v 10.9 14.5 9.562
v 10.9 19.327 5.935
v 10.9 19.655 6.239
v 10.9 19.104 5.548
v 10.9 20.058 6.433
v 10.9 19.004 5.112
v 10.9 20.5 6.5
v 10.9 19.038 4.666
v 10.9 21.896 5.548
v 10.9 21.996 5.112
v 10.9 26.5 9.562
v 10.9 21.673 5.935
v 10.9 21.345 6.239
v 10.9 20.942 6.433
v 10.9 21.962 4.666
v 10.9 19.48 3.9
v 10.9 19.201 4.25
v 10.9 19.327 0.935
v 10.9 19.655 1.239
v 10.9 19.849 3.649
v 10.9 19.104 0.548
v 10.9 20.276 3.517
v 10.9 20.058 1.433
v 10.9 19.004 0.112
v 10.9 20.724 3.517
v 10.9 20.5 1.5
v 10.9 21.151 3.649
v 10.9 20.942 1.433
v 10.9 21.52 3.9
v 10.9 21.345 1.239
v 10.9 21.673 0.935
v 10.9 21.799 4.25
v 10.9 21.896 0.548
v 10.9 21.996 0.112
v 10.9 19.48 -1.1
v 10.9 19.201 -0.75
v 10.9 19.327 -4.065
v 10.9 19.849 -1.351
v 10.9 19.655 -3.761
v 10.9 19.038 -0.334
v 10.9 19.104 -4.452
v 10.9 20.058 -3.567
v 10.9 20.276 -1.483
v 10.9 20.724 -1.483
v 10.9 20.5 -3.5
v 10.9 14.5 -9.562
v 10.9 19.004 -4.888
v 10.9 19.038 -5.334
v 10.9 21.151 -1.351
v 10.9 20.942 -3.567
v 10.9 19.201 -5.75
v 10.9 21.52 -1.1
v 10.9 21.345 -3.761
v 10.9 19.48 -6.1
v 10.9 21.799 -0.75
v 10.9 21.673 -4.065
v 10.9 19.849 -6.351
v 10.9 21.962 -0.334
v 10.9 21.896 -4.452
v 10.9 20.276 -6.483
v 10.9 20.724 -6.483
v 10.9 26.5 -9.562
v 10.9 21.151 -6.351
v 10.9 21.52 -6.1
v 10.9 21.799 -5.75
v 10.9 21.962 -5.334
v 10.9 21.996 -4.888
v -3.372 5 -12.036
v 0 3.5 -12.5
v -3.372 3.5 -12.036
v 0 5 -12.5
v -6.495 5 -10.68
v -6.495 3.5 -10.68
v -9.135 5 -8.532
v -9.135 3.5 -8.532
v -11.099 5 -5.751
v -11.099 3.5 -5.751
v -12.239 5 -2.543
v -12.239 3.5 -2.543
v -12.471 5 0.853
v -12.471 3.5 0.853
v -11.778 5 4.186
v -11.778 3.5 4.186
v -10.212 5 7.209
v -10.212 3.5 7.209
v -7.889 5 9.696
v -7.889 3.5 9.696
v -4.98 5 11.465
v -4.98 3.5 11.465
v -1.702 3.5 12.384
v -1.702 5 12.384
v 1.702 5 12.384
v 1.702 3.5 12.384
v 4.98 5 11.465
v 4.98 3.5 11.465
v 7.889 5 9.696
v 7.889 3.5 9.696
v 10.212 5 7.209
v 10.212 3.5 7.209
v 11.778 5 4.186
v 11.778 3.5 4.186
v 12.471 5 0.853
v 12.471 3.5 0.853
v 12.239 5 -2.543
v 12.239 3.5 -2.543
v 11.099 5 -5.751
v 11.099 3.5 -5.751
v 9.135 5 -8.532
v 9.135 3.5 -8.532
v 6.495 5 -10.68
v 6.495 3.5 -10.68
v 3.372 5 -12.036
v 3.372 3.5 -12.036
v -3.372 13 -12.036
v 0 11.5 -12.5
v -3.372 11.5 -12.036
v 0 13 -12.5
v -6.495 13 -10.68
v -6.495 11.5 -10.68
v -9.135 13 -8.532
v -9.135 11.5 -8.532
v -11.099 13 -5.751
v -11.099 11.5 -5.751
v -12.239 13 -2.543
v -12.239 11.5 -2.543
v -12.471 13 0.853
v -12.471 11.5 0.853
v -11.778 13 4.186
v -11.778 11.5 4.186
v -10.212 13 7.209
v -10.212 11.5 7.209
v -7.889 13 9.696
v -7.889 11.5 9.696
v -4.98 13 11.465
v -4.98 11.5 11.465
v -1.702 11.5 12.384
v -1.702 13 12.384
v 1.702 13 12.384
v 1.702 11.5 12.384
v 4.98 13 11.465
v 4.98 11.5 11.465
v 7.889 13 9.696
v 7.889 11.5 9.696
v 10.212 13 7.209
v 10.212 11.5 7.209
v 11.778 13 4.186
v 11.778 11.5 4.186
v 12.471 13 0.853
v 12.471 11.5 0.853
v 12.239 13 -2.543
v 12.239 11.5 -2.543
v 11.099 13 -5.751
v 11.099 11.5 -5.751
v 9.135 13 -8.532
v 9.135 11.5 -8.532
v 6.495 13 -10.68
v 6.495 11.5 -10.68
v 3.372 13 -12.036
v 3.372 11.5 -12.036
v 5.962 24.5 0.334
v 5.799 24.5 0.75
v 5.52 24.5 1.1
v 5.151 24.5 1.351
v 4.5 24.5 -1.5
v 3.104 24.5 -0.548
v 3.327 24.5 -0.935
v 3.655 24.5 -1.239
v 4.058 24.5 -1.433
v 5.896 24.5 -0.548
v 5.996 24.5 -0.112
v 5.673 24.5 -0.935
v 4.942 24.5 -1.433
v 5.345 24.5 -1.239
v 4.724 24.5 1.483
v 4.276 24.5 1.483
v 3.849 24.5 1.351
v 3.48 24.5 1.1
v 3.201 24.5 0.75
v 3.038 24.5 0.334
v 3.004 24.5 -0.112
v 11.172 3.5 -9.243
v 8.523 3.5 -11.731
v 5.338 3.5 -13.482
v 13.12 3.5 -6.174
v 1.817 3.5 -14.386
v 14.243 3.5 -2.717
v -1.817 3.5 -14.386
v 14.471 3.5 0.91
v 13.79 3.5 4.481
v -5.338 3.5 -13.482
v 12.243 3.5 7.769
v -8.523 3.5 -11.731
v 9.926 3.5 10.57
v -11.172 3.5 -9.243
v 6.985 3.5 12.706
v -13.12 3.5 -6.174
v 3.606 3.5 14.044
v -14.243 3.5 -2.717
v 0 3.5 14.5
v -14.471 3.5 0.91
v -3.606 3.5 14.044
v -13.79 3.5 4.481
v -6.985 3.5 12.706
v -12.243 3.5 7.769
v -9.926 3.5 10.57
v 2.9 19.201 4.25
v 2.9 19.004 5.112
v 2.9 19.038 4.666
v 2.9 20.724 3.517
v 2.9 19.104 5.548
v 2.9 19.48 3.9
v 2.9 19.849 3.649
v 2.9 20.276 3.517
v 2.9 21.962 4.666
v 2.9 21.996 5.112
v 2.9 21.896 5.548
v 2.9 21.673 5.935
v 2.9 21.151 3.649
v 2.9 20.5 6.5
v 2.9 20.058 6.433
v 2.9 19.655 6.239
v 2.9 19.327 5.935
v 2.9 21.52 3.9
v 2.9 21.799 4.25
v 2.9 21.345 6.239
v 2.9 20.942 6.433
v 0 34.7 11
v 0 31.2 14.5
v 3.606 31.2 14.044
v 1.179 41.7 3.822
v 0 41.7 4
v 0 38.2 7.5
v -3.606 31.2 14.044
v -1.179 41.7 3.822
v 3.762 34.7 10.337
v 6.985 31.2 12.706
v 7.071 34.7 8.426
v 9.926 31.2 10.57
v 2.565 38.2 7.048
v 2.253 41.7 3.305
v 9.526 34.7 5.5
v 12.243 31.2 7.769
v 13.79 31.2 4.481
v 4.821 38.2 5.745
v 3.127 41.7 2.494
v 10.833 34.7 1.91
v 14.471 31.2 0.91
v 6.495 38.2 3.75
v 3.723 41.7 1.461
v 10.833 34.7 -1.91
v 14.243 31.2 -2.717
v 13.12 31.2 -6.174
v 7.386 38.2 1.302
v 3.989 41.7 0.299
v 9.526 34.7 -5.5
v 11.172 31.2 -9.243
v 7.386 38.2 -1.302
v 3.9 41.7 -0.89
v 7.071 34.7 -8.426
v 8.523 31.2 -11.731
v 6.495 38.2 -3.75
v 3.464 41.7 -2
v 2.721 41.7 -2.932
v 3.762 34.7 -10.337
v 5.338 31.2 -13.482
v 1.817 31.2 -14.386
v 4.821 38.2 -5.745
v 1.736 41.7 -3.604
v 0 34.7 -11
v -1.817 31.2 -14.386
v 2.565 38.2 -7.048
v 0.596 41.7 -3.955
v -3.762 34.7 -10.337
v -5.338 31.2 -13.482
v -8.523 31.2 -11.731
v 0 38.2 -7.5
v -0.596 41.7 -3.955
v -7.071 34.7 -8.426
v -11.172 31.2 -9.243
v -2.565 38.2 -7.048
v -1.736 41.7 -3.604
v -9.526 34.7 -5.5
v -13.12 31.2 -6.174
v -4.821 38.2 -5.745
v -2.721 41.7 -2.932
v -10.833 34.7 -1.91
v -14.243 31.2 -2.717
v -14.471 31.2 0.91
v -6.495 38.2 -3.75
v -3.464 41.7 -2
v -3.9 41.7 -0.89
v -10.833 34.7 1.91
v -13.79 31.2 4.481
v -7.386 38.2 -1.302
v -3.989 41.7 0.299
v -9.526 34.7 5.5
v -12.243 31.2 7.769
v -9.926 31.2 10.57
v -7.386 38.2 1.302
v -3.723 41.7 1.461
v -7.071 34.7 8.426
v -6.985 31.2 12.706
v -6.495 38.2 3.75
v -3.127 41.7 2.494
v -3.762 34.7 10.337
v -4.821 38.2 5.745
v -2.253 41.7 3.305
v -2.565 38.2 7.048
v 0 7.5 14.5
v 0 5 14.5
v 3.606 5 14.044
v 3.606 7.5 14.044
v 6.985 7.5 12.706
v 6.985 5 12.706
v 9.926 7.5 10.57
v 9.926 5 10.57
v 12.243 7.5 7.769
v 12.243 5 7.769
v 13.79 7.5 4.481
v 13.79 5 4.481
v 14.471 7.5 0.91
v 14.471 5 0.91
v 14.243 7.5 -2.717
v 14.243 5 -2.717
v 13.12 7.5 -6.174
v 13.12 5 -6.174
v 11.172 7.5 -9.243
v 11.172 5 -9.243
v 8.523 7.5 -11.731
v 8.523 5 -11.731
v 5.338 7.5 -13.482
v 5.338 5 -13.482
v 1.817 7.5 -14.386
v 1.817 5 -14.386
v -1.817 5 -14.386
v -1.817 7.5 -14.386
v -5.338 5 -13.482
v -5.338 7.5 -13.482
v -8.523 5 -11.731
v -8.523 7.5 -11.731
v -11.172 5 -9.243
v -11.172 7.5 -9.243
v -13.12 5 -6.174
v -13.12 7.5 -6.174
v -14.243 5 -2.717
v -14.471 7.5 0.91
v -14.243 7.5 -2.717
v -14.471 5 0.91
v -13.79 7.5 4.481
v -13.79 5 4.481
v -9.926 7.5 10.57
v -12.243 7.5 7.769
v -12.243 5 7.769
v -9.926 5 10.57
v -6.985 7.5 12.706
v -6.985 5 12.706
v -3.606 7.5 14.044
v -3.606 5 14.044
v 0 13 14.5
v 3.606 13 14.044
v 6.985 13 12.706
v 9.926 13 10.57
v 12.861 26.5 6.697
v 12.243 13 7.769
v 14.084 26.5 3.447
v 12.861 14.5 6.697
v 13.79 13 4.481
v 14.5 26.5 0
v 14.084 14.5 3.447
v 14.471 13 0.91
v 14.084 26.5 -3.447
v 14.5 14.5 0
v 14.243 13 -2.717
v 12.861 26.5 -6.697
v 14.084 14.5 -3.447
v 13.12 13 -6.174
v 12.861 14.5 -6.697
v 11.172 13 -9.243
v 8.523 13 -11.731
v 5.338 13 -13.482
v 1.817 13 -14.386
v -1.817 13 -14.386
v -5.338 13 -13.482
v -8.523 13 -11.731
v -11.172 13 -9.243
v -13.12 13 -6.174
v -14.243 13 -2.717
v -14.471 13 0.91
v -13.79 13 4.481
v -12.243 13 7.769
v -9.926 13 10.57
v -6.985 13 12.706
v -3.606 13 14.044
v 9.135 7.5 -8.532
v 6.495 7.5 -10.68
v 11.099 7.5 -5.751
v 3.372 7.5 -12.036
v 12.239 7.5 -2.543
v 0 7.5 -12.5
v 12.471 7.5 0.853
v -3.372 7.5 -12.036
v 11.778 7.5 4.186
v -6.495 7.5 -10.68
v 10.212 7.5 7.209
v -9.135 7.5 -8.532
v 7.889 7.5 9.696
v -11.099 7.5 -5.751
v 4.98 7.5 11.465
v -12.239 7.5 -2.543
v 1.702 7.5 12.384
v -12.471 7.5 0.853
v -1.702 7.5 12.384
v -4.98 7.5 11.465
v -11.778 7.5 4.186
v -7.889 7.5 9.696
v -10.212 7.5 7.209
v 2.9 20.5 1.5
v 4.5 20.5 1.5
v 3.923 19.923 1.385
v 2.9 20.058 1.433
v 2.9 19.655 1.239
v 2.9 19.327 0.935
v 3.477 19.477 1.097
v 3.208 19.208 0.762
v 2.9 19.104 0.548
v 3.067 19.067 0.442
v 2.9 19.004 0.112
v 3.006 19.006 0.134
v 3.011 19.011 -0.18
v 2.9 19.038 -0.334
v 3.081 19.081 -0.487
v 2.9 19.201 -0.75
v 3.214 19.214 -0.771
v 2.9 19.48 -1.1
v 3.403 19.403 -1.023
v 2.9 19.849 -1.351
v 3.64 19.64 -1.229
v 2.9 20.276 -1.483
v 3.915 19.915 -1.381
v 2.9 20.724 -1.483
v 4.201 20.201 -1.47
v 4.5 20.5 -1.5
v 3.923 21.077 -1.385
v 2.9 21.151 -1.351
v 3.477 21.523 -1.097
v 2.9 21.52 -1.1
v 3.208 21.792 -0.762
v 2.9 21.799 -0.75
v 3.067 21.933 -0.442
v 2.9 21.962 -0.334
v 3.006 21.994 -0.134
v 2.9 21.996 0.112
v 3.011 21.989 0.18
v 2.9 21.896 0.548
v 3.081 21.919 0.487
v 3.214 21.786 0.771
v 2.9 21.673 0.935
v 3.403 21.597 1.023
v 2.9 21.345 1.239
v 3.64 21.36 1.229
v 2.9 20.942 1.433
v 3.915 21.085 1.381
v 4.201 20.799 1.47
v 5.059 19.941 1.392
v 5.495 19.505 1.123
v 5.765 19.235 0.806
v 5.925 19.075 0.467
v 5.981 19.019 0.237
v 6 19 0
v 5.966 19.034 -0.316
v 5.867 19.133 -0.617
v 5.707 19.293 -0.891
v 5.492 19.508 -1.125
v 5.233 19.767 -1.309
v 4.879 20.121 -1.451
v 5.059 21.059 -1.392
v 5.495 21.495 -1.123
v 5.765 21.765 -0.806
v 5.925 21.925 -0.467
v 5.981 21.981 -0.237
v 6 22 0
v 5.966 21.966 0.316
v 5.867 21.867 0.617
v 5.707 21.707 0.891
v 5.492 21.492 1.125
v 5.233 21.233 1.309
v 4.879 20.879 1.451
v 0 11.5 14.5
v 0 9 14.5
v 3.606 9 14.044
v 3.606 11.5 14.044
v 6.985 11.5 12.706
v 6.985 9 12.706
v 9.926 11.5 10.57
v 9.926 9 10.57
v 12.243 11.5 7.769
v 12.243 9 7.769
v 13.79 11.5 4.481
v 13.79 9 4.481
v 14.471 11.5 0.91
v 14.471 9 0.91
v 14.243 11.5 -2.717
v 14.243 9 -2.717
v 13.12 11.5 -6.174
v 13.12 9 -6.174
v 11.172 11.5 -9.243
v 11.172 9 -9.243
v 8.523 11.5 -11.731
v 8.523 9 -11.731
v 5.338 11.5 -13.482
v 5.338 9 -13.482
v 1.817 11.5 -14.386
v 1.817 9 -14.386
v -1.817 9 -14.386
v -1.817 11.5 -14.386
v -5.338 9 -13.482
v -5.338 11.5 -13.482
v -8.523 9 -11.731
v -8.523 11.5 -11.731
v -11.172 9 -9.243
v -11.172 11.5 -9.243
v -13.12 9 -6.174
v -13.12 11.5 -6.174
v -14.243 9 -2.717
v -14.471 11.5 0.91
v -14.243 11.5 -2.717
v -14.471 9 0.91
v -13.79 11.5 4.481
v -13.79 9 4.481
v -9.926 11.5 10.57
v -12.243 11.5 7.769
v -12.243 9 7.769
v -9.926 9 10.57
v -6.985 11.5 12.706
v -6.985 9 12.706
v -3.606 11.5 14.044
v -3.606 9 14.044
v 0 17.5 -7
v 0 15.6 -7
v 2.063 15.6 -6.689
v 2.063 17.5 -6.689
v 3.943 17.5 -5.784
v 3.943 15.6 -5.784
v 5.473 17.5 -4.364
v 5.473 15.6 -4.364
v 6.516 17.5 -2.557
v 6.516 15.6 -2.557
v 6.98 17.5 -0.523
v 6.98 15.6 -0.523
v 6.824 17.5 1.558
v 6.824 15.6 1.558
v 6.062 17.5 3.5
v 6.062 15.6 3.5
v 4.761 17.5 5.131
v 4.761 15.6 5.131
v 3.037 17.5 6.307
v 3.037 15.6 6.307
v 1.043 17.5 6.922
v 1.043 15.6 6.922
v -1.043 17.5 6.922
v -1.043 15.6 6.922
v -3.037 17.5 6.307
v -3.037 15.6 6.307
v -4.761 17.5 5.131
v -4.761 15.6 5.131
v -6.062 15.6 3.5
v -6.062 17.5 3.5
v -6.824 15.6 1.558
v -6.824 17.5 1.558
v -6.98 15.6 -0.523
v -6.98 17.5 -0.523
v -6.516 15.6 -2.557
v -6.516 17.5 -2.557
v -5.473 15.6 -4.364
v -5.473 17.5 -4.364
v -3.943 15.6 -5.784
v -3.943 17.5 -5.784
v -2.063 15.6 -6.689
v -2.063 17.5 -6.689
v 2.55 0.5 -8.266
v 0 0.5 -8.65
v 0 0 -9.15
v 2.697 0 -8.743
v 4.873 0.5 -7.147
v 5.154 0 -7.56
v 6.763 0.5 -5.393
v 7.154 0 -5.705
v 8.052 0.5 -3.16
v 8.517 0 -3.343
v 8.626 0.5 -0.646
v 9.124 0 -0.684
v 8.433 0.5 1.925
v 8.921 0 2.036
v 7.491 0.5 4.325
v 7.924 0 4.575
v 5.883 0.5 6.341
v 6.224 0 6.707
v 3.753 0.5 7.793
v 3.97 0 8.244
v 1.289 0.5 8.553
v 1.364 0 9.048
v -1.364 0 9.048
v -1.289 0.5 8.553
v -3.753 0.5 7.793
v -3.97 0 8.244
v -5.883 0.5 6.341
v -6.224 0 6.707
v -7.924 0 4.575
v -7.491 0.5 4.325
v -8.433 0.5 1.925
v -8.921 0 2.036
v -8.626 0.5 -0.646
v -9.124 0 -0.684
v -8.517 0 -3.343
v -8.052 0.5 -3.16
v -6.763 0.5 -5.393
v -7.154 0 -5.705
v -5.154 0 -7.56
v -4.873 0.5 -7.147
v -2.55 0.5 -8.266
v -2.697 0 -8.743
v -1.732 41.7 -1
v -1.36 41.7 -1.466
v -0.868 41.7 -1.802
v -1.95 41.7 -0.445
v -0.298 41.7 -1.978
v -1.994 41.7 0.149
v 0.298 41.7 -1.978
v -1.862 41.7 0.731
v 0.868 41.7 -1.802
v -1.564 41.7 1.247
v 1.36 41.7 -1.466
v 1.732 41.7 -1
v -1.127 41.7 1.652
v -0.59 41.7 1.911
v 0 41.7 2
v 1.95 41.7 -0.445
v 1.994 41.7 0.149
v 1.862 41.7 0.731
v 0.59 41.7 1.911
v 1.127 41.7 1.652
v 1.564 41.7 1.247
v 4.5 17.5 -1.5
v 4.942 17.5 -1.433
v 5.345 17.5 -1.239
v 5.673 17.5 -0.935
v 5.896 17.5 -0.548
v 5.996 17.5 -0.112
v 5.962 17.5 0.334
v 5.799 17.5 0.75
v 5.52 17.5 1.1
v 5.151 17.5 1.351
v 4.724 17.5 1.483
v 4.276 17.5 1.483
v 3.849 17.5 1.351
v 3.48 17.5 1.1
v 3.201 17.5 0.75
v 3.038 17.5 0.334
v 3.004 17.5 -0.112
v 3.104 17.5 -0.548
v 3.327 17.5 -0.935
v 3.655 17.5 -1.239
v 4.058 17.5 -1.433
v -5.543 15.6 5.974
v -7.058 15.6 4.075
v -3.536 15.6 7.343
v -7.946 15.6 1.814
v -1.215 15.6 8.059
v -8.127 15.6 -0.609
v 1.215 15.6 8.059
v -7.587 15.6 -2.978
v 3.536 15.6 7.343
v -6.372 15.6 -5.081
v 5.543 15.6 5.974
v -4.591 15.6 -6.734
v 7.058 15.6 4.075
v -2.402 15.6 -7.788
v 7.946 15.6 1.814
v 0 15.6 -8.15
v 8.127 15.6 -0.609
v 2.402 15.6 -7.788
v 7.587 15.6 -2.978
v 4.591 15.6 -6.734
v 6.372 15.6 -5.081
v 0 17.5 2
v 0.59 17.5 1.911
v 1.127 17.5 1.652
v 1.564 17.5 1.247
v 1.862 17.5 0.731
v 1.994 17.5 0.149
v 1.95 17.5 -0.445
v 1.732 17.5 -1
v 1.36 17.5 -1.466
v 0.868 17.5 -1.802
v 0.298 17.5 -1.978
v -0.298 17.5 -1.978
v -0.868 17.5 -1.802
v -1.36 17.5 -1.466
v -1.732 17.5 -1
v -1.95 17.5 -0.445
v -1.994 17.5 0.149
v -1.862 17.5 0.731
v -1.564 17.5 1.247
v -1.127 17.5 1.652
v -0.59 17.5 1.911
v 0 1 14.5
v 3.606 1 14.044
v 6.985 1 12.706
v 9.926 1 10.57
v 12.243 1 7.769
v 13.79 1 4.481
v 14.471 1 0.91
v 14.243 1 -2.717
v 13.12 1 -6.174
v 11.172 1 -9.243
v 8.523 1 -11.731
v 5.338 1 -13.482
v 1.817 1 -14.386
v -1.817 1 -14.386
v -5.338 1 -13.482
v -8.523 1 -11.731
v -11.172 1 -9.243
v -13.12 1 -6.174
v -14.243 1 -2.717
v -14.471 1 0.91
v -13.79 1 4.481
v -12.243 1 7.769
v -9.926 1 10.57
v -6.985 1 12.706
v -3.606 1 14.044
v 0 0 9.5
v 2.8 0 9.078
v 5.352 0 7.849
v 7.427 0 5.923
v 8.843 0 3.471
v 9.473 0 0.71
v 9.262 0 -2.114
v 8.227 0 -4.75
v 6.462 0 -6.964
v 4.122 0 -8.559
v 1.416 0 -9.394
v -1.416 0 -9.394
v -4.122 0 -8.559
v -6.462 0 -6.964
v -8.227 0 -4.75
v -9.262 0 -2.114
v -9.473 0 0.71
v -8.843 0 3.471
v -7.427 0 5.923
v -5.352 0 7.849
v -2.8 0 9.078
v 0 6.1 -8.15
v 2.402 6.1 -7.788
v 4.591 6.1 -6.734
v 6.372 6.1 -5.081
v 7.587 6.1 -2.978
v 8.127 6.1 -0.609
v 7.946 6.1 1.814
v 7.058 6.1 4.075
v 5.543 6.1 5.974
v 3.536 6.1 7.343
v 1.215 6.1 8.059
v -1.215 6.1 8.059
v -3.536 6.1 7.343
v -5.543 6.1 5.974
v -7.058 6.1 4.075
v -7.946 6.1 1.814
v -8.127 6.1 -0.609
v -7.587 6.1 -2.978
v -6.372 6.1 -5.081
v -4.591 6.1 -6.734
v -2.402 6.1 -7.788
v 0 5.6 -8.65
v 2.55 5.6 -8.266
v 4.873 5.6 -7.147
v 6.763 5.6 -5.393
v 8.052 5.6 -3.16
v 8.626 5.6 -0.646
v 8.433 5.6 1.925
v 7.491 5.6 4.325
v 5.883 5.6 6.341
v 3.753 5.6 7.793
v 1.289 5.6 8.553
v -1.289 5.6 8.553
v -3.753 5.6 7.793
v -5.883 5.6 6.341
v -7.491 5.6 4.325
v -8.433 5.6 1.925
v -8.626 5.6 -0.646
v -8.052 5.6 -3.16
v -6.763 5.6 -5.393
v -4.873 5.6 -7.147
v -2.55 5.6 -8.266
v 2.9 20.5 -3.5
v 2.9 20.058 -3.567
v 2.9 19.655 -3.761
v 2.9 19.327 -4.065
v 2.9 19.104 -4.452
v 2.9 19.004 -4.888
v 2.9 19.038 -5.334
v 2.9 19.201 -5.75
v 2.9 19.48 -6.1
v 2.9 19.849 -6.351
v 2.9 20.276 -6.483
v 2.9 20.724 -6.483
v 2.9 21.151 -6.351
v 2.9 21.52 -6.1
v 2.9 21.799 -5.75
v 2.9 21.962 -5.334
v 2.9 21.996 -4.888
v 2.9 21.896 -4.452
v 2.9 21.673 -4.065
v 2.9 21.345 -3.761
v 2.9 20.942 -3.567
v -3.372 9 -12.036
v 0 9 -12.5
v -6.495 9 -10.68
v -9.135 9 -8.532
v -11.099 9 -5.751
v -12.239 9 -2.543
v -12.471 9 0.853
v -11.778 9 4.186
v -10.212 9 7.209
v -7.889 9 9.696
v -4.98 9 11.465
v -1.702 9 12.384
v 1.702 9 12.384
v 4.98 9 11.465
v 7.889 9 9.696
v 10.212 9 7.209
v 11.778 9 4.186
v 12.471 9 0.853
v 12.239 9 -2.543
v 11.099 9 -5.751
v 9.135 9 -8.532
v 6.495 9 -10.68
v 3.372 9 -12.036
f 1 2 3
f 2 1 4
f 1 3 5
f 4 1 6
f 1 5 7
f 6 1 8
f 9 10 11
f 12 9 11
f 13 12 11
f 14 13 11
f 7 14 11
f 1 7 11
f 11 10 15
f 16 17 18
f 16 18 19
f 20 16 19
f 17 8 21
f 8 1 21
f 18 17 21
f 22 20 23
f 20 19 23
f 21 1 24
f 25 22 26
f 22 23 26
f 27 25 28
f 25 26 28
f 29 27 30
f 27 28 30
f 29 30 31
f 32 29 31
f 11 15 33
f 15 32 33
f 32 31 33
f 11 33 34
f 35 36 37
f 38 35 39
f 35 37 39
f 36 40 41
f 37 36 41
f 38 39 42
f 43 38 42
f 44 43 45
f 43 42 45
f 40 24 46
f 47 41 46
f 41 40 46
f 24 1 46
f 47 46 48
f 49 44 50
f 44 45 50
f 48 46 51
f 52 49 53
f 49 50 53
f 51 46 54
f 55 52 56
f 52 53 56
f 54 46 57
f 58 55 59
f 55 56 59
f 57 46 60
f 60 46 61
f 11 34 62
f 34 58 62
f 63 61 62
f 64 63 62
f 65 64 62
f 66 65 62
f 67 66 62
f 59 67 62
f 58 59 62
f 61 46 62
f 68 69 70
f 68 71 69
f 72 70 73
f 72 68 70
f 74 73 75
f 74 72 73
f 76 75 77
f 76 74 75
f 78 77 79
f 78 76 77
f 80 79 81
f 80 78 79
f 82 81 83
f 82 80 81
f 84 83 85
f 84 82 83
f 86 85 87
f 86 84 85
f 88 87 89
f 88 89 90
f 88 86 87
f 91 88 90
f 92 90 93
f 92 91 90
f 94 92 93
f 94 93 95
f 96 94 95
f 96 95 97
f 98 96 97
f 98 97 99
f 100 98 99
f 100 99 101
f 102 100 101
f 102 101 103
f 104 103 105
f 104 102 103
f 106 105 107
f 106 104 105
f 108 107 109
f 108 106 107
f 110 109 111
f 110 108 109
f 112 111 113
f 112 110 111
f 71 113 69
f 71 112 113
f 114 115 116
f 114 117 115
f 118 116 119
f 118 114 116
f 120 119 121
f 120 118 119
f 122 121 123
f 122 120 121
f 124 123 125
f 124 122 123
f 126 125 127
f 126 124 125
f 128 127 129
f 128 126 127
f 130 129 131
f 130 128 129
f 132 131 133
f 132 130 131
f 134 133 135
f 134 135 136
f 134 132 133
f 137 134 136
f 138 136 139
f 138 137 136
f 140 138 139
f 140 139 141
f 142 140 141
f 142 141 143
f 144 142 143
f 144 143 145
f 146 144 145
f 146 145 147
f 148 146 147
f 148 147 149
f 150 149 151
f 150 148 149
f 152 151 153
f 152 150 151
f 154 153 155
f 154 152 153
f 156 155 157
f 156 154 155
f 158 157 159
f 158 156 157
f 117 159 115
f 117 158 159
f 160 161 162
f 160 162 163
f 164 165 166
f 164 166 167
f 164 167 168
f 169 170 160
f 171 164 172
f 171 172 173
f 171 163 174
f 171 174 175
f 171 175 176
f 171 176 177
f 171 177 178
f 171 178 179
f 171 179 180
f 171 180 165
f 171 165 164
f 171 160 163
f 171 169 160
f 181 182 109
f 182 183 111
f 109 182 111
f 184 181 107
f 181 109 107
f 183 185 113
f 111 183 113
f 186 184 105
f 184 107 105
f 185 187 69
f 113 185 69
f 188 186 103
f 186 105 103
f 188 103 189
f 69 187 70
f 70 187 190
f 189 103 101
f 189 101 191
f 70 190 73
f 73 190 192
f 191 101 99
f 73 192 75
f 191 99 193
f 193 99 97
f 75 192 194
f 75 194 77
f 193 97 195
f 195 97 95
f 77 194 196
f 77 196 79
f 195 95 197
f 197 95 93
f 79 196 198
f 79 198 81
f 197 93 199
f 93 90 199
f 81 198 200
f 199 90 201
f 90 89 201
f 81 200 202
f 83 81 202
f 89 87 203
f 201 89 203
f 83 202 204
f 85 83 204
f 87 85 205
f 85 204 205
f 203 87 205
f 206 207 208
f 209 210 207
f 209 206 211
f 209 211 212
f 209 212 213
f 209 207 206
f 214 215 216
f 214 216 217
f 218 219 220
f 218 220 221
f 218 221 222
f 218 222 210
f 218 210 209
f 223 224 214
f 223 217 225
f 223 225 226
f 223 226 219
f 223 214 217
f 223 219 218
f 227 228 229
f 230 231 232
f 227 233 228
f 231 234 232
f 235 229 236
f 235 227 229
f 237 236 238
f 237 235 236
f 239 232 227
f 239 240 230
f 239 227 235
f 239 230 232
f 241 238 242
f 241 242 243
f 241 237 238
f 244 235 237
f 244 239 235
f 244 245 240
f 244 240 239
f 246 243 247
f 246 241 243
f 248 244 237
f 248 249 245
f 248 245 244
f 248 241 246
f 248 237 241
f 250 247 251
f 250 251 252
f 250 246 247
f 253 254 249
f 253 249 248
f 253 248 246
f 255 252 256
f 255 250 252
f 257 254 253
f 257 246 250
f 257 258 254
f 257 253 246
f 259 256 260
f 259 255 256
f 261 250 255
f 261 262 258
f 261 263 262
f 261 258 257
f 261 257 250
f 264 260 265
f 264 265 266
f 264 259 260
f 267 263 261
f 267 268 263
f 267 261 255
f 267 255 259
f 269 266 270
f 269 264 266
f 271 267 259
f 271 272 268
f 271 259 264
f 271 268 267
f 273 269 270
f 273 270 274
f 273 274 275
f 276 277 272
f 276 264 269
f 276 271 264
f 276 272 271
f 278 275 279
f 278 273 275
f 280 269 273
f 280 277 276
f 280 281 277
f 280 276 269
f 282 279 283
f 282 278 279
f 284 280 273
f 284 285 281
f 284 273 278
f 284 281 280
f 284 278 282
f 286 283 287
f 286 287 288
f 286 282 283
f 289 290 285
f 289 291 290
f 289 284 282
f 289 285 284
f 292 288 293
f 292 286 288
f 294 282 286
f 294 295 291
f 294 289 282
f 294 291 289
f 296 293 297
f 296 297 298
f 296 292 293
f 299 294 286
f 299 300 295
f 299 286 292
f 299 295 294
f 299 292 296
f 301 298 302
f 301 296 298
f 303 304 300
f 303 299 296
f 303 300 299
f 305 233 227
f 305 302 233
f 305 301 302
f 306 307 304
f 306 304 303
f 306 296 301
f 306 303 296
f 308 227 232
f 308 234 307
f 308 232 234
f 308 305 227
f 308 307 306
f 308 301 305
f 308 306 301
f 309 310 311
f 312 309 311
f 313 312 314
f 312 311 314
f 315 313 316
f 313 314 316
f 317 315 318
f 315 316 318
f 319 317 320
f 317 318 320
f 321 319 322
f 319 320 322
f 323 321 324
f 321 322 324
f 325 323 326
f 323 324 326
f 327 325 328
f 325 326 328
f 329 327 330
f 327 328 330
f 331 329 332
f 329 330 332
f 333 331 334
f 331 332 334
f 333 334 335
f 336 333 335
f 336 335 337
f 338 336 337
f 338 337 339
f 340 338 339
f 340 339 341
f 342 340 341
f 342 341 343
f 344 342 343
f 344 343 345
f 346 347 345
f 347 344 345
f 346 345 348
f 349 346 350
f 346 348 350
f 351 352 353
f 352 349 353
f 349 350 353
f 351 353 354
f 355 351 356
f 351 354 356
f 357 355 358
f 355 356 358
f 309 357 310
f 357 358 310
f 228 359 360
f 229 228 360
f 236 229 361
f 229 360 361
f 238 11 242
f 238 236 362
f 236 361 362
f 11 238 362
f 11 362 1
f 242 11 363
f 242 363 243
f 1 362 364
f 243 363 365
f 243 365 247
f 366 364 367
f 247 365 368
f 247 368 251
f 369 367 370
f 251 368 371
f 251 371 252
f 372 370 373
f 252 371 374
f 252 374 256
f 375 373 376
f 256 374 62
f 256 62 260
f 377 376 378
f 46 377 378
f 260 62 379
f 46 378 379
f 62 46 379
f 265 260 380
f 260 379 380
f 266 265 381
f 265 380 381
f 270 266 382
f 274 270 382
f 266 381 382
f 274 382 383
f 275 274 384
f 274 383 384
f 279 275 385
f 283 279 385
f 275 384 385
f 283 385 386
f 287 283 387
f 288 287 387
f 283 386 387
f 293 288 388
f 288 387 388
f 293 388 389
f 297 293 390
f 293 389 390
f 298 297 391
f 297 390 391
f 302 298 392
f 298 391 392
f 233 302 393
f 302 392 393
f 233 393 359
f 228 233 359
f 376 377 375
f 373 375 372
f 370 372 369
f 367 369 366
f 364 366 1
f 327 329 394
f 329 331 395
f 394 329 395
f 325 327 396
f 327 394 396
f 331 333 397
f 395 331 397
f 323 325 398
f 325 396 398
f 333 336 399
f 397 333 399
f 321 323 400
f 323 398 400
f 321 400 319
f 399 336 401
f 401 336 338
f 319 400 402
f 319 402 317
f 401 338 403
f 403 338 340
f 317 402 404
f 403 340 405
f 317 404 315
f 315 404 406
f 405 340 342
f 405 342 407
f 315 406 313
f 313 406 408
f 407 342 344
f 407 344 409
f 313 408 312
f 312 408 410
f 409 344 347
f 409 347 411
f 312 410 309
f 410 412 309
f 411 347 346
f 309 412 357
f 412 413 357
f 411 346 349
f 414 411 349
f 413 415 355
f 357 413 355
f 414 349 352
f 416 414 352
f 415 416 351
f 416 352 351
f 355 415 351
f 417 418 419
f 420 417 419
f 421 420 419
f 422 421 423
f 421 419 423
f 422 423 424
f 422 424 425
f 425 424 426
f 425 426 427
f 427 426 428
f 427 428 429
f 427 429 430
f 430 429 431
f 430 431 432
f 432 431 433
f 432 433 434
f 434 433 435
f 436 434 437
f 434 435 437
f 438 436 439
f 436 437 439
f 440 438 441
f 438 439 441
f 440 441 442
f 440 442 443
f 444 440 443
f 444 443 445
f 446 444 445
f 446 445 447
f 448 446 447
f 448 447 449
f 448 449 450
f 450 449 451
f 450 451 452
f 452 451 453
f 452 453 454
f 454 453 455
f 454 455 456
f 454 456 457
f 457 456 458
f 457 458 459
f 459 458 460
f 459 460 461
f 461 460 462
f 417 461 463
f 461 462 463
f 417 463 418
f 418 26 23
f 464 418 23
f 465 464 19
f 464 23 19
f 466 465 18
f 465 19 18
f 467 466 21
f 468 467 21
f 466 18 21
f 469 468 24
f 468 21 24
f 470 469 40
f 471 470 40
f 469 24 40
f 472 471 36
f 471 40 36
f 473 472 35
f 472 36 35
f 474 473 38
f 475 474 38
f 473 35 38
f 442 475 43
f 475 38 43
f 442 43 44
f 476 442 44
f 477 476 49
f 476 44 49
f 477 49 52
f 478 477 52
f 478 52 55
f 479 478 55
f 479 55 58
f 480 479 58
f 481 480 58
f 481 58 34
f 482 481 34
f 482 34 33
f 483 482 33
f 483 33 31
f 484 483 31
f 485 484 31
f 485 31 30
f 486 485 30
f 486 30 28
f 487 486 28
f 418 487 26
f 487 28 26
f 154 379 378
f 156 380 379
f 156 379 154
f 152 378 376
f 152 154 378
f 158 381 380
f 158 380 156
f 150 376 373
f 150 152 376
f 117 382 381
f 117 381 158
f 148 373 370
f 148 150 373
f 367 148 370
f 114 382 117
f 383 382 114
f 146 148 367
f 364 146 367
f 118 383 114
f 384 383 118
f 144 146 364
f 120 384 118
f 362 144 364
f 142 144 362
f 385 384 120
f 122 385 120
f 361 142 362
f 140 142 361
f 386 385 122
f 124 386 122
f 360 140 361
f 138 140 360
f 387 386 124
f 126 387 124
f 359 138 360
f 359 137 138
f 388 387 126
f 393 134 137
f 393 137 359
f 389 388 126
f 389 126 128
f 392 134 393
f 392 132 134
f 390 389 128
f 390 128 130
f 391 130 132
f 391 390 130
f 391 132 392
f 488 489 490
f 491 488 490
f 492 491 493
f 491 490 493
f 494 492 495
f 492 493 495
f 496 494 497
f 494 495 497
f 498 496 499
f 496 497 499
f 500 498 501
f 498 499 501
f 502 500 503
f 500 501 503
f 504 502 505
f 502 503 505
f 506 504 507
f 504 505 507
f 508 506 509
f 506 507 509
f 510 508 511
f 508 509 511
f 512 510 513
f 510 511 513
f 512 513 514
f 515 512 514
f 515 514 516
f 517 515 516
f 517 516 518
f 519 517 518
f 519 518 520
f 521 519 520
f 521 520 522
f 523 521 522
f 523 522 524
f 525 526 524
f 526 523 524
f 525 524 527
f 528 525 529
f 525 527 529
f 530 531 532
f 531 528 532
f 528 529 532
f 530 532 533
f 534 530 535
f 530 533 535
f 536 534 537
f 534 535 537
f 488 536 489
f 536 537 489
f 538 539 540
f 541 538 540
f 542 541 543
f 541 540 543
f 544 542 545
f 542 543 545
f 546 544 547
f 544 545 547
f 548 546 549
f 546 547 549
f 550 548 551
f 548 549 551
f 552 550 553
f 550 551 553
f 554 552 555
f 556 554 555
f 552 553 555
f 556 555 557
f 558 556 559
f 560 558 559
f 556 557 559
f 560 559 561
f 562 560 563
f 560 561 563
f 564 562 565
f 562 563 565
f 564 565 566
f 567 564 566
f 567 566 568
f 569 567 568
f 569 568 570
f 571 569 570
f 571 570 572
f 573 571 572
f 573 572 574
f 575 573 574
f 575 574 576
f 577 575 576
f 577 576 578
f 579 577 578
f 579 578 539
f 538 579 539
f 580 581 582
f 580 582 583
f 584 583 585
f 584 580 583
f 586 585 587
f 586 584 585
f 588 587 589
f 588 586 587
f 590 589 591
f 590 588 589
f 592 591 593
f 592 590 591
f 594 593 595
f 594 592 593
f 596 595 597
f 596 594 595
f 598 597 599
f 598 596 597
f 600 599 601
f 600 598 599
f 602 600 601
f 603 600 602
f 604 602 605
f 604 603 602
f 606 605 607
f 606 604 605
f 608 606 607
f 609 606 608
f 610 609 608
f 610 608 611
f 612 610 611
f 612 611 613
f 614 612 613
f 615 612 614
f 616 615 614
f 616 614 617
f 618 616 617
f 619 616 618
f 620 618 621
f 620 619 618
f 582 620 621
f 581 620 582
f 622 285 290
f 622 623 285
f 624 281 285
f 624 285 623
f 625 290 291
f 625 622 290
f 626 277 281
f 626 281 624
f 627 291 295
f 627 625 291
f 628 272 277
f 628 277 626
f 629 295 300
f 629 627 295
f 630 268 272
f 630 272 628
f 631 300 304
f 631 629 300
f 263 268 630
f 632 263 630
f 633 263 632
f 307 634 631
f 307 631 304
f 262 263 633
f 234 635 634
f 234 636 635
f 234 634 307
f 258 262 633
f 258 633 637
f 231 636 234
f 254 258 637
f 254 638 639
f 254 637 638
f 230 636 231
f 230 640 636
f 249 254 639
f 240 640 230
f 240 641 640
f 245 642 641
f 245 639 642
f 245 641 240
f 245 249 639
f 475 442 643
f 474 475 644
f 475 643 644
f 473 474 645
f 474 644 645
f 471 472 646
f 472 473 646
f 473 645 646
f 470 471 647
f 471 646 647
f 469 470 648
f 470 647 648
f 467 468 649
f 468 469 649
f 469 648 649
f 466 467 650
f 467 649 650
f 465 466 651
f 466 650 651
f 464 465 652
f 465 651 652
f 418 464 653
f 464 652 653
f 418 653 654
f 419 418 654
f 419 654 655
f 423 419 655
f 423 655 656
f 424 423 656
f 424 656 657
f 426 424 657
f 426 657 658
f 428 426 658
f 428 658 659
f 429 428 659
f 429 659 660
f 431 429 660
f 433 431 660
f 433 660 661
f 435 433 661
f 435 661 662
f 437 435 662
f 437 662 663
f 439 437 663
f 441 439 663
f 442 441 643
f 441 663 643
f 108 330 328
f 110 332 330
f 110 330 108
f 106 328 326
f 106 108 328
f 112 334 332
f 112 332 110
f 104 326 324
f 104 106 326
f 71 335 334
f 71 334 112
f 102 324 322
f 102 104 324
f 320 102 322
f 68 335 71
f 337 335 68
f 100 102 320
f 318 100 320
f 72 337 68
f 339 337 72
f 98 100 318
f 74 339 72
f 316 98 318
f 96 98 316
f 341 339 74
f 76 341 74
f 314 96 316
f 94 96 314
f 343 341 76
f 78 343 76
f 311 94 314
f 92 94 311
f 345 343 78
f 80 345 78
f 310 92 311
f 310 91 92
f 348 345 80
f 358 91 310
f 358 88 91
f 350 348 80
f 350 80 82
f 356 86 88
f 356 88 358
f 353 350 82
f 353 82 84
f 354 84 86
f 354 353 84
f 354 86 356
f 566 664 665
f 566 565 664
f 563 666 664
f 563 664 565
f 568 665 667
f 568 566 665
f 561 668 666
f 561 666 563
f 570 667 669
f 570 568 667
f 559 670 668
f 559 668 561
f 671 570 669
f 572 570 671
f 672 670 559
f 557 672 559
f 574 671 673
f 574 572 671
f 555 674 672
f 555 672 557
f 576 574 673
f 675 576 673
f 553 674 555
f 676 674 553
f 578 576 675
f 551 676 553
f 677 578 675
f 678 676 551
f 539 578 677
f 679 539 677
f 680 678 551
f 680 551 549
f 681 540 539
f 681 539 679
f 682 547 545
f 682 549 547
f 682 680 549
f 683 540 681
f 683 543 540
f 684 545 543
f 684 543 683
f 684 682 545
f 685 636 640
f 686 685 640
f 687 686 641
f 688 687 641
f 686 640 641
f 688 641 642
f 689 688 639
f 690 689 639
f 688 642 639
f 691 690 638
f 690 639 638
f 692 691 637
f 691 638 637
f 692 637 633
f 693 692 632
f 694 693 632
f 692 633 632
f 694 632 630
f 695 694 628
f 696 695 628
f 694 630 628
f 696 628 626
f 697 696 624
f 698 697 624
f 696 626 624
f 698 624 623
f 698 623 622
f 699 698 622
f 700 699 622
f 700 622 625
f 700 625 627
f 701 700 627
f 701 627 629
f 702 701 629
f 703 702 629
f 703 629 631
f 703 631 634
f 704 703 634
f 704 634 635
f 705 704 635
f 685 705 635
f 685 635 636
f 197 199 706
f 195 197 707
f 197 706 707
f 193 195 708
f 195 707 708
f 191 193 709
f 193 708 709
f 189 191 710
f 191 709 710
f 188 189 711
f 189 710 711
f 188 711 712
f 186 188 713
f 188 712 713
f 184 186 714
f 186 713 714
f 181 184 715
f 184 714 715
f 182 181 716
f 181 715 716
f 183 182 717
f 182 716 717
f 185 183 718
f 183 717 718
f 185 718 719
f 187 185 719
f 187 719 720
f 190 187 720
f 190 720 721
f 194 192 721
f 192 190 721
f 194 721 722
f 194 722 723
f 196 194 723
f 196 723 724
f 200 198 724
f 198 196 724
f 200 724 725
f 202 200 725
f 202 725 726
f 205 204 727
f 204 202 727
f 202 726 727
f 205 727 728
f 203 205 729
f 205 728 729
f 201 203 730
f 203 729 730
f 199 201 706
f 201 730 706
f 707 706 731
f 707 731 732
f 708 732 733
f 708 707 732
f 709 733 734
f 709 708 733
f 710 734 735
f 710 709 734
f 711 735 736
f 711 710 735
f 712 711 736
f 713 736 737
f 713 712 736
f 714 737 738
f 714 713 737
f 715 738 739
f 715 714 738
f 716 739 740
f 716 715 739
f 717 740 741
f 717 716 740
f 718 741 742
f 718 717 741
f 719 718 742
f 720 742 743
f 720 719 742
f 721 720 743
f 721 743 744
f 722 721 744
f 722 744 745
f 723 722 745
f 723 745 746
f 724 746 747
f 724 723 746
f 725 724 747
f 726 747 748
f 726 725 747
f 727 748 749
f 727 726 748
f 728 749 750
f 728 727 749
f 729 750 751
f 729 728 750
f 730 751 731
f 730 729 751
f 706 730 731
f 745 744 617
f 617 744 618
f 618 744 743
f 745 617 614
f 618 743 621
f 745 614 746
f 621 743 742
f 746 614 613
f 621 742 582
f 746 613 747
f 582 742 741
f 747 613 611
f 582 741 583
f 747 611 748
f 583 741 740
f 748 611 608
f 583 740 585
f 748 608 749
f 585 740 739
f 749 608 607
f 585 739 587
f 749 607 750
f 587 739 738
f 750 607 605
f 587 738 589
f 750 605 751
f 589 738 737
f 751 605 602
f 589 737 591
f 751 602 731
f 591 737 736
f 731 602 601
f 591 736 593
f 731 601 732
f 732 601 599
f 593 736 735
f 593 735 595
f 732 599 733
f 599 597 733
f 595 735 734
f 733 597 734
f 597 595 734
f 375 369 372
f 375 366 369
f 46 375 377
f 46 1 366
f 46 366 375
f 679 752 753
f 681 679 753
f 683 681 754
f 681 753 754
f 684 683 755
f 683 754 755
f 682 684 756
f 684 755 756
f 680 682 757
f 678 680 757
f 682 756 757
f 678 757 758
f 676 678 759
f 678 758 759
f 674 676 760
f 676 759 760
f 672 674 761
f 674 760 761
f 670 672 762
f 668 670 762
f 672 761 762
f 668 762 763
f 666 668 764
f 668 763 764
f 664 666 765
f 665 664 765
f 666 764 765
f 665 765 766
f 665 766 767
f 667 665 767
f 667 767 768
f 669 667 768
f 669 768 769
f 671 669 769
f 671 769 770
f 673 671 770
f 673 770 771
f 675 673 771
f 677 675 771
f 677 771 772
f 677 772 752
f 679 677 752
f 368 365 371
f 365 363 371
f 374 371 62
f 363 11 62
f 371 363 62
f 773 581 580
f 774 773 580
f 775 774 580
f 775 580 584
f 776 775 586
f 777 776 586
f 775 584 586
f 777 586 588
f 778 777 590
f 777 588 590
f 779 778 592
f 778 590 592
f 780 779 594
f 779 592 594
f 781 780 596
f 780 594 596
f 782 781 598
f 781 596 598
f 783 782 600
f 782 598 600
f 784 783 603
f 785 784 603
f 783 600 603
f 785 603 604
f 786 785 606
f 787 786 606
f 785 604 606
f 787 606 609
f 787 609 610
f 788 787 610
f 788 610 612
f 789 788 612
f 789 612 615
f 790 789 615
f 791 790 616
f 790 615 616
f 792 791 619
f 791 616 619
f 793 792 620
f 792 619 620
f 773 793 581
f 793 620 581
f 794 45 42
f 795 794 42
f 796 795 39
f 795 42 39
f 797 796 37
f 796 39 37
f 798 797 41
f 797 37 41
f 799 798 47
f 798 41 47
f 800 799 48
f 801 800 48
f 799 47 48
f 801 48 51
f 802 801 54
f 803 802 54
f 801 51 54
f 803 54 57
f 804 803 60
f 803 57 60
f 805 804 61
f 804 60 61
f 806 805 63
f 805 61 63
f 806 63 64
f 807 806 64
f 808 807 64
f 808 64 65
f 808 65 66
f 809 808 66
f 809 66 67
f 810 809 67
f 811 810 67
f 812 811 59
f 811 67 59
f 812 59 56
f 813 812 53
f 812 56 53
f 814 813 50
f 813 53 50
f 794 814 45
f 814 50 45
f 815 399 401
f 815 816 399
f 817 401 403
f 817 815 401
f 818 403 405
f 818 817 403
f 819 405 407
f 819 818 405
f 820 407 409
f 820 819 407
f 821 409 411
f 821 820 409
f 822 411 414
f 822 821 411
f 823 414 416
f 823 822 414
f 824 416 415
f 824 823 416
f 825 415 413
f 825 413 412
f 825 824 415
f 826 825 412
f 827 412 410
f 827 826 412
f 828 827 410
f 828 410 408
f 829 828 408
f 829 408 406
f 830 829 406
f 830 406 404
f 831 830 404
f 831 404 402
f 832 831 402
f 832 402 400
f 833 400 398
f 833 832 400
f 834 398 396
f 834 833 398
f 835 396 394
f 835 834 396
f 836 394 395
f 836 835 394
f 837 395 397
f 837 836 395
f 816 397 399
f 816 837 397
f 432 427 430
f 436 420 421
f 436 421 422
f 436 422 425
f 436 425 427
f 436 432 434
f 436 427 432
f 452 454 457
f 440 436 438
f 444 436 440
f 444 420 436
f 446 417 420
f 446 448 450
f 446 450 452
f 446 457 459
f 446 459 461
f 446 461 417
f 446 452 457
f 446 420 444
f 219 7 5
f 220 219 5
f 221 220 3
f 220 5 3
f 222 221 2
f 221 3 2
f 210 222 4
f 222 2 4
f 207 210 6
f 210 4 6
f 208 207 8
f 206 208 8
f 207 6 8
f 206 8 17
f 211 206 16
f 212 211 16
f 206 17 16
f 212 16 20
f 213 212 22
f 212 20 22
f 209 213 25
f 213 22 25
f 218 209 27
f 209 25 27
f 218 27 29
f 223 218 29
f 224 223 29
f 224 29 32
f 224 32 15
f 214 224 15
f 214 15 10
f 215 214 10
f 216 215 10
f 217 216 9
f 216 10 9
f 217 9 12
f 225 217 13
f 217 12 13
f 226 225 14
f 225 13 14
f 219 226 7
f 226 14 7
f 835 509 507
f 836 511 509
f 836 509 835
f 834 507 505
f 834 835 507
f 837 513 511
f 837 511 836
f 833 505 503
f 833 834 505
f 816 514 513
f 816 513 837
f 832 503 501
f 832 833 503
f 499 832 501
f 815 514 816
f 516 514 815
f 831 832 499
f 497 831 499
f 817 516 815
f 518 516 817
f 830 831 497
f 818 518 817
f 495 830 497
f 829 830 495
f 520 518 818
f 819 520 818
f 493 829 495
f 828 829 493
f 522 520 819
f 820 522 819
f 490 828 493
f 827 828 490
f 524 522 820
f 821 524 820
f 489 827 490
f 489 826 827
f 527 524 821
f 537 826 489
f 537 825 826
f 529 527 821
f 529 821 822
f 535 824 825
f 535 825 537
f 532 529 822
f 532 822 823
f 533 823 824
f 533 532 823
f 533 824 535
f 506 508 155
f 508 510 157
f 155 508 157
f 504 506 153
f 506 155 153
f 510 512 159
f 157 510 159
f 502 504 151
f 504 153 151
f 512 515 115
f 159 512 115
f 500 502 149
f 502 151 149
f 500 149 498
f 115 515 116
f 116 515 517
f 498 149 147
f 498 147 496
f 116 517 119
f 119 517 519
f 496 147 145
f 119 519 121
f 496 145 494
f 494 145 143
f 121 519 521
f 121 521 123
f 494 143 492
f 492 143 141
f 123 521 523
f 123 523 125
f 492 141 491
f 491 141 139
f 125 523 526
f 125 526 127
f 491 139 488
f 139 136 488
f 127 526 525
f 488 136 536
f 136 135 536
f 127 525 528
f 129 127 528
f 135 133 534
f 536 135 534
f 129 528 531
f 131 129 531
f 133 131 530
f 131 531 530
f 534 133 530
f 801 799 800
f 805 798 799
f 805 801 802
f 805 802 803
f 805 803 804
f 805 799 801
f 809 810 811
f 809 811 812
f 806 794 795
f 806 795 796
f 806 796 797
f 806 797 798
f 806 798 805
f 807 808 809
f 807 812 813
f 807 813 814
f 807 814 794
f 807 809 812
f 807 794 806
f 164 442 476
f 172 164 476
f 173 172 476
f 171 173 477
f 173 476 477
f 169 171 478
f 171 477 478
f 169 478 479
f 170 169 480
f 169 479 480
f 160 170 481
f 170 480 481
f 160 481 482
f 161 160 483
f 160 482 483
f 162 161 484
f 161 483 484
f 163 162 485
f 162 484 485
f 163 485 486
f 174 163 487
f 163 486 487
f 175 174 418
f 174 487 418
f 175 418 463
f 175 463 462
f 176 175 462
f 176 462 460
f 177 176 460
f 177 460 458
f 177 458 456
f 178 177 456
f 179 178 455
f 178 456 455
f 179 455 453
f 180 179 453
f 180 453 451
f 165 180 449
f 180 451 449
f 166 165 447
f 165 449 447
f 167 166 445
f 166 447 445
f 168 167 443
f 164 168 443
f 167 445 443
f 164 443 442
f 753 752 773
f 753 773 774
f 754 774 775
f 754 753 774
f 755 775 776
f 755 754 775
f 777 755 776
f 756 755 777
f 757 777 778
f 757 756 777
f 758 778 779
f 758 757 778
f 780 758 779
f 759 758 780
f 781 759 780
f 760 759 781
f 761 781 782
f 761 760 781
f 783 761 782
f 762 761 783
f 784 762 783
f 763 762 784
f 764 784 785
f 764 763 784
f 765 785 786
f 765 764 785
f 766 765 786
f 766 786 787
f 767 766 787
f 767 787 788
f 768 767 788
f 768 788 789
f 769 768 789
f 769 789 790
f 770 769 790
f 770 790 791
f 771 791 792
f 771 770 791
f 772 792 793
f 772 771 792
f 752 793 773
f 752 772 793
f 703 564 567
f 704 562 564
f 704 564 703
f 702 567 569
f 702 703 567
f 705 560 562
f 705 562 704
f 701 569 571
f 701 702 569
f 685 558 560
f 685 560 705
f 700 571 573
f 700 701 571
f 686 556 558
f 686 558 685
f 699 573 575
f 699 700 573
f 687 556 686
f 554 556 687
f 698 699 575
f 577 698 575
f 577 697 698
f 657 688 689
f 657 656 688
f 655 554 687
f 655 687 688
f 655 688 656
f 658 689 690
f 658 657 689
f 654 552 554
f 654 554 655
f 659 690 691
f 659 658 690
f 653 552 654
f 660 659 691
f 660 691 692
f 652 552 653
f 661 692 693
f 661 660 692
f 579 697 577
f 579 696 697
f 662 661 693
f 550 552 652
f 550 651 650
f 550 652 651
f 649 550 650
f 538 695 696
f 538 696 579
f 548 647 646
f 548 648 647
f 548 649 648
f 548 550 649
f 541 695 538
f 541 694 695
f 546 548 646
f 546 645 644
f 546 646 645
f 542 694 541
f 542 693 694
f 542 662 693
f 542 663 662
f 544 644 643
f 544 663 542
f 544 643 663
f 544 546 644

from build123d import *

# Parameters (mm, degrees)
SKETCH_1_R               = 14.5
EXTRUDE_1_DEPTH          = 41.7
CHAMFER_1_SIZE           = 10.5
SKETCH_2_R               = 2
CUT_EXTRUDE_1_DEPTH      = 47.469237136
CHAMFER_2_SIZE           = 5
CHAMFER_2_SIZE2          = 1
SKETCH_3_W               = 2
SKETCH_3_H               = 1.5
CUT_EXTRUDE_2_DEPTH      = 47.469237136
CUT_EXTRUDE_2_DEPTH_BACK = 47.469237136
SKETCH_5_W               = 6.979253001
SKETCH_5_H               = 12
SKETCH_6_R               = 8.65
CUT_EXTRUDE_3_DEPTH      = 5.6
CHAMFER_3_SIZE           = 0.5
SKETCH_7_R               = 8.15
CUT_EXTRUDE_4_DEPTH      = 15.6
CHAMFER_4_SIZE           = 0.5
SKETCH_8_R               = 7
CUT_EXTRUDE_5_DEPTH      = 17.5
CUT_EXTRUDE_6_DEPTH      = 8
CUT_EXTRUDE_7_DEPTH      = 8
SKETCH_10_R              = 1.5
CUT_EXTRUDE_8_DEPTH      = 7


with BuildPart() as part:
    # 草图1 → 凸台-拉伸1 (new body)
    with BuildSketch(Plane(origin=(0, 0, 0), x_dir=(1, 0, 0), z_dir=(0, 1, 0))):
        with Locations(Location((0, 0, 0), (0, 0, 270))):
            Circle(SKETCH_1_R)
    extrude(amount=EXTRUDE_1_DEPTH)

    # 倒角1
    chamfer_1_edges = [part.edges().sort_by_distance(p)[0] for p in [
        (0, 41.7, -14.5),
    ]]
    chamfer(chamfer_1_edges, length=CHAMFER_1_SIZE)

    # 草图2 → 切除-拉伸1 (cut, through all)
    with BuildSketch(Plane(origin=(0, 41.7, 0), x_dir=(1, 0, 0), z_dir=(0, 1, 0))):
        with Locations(Location((0, 0, 0), (0, 0, 270))):
            Circle(SKETCH_2_R)
    extrude(amount=-CUT_EXTRUDE_1_DEPTH, mode=Mode.SUBTRACT)

    # 倒角2
    chamfer_2_edges = [part.edges().sort_by_distance(p)[0] for p in [
        (0, 0, -14.5),
    ]]
    chamfer_2_side = [part.faces().sort_by_distance(p)[0] for p in [
        (0, 0, -14.089878067),
    ]]
    chamfer(chamfer_2_edges, length=CHAMFER_2_SIZE, length2=CHAMFER_2_SIZE2, reference=chamfer_2_side[0])

    # 草图3 → 切除-旋转1 (revolve, cut)
    with BuildSketch(Plane.XY, mode=Mode.PRIVATE) as cut_revolve_1_sk:
        with Locations((13.5, 4.25)):
            Rectangle(SKETCH_3_W, SKETCH_3_H)
        with Locations((13.5, 8.25)):
            Rectangle(SKETCH_3_W, SKETCH_3_H)
        with Locations((13.5, 12.25)):
            Rectangle(SKETCH_3_W, SKETCH_3_H)
    revolve(cut_revolve_1_sk.sketch.rotate(Axis((0, 0, 0), (0, 1, 0)), 90), axis=Axis((0, 0, 0), (0, 1, 0)), mode=Mode.SUBTRACT)

    # 草图5 → 切除-拉伸2 (cut, two sides: drawn at the far end of the back side and taken through both)
    with BuildSketch(Plane.XY.offset(-CUT_EXTRUDE_2_DEPTH_BACK)):
        with Locations((14.389626501, 20.5)):
            Rectangle(SKETCH_5_W, SKETCH_5_H)
    extrude(amount=CUT_EXTRUDE_2_DEPTH + CUT_EXTRUDE_2_DEPTH_BACK, mode=Mode.SUBTRACT)

    # 草图6 → 切除-拉伸3 (cut)
    with BuildSketch(Plane.XZ):
        with Locations(Location((0, 0, 0), (0, 0, 270))):
            Circle(SKETCH_6_R)
    extrude(amount=-CUT_EXTRUDE_3_DEPTH, mode=Mode.SUBTRACT)

    # 倒角3
    chamfer_3_edges = [part.edges().sort_by_distance(p)[0] for p in [
        (0, 0, 8.65),
    ]]
    chamfer(chamfer_3_edges, length=CHAMFER_3_SIZE)

    # 草图7 → 切除-拉伸4 (cut)
    with BuildSketch(Plane.XZ):
        with Locations(Location((0, 0, 0), (0, 0, 270))):
            Circle(SKETCH_7_R)
    extrude(amount=-CUT_EXTRUDE_4_DEPTH, mode=Mode.SUBTRACT)

    # 倒角4
    chamfer_4_edges = [part.edges().sort_by_distance(p)[0] for p in [
        (0, 5.6, 8.15),
    ]]
    chamfer(chamfer_4_edges, length=CHAMFER_4_SIZE - 0.0001)  # a hair under: the kernel refuses the full size

    # 草图8 → 切除-拉伸5 (cut)
    with BuildSketch(Plane.XZ):
        with Locations(Location((0, 0, 0), (0, 0, 270))):
            Circle(SKETCH_8_R)
    extrude(amount=-CUT_EXTRUDE_5_DEPTH, mode=Mode.SUBTRACT)

    # 草图9 → 切除-拉伸6 (cut)
    with BuildSketch(Plane(origin=(10.9, 0, 0), x_dir=(0, 0, -1), z_dir=(1, 0, 0))):
        with BuildLine():
            ThreePointArc((-3.5, 20.5), (-5, 22), (-6.5, 20.5))
            Line((-6.5, 20.5), (-3.5, 20.5))
        make_face()
        with BuildLine():
            Line((-3.5, 20.5), (-6.5, 20.5))
            ThreePointArc((-6.5, 20.5), (-5, 19), (-3.5, 20.5))
        make_face()
        with BuildLine():
            ThreePointArc((6.5, 20.5), (5, 22), (3.5, 20.5))
            Line((3.5, 20.5), (6.5, 20.5))
        make_face()
        with BuildLine():
            Line((6.5, 20.5), (3.5, 20.5))
            ThreePointArc((3.5, 20.5), (5, 19), (6.5, 20.5))
        make_face()
    extrude(amount=-CUT_EXTRUDE_6_DEPTH, mode=Mode.SUBTRACT)

    # 草图9<3> → 切除-拉伸7 (cut)
    with BuildSketch(Plane(origin=(10.9, 0, 0), x_dir=(0, 0, -1), z_dir=(1, 0, 0))):
        with BuildLine():
            ThreePointArc((1.5, 20.5), (0, 22), (-1.5, 20.5))
            Line((-1.5, 20.5), (1.5, 20.5))
        make_face()
        with BuildLine():
            Line((1.5, 20.5), (-1.5, 20.5))
            ThreePointArc((-1.5, 20.5), (0, 19), (1.5, 20.5))
        make_face()
    extrude(amount=-CUT_EXTRUDE_7_DEPTH, mode=Mode.SUBTRACT)

    # 草图10 → 切除-拉伸8 (cut)
    with BuildSketch(Plane.XZ.offset(-17.5)):
        with Locations(Location((4.5, 0, 0), (0, 0, 270))):
            Circle(SKETCH_10_R)
    extrude(amount=-CUT_EXTRUDE_8_DEPTH, mode=Mode.SUBTRACT)


solid = part.part
